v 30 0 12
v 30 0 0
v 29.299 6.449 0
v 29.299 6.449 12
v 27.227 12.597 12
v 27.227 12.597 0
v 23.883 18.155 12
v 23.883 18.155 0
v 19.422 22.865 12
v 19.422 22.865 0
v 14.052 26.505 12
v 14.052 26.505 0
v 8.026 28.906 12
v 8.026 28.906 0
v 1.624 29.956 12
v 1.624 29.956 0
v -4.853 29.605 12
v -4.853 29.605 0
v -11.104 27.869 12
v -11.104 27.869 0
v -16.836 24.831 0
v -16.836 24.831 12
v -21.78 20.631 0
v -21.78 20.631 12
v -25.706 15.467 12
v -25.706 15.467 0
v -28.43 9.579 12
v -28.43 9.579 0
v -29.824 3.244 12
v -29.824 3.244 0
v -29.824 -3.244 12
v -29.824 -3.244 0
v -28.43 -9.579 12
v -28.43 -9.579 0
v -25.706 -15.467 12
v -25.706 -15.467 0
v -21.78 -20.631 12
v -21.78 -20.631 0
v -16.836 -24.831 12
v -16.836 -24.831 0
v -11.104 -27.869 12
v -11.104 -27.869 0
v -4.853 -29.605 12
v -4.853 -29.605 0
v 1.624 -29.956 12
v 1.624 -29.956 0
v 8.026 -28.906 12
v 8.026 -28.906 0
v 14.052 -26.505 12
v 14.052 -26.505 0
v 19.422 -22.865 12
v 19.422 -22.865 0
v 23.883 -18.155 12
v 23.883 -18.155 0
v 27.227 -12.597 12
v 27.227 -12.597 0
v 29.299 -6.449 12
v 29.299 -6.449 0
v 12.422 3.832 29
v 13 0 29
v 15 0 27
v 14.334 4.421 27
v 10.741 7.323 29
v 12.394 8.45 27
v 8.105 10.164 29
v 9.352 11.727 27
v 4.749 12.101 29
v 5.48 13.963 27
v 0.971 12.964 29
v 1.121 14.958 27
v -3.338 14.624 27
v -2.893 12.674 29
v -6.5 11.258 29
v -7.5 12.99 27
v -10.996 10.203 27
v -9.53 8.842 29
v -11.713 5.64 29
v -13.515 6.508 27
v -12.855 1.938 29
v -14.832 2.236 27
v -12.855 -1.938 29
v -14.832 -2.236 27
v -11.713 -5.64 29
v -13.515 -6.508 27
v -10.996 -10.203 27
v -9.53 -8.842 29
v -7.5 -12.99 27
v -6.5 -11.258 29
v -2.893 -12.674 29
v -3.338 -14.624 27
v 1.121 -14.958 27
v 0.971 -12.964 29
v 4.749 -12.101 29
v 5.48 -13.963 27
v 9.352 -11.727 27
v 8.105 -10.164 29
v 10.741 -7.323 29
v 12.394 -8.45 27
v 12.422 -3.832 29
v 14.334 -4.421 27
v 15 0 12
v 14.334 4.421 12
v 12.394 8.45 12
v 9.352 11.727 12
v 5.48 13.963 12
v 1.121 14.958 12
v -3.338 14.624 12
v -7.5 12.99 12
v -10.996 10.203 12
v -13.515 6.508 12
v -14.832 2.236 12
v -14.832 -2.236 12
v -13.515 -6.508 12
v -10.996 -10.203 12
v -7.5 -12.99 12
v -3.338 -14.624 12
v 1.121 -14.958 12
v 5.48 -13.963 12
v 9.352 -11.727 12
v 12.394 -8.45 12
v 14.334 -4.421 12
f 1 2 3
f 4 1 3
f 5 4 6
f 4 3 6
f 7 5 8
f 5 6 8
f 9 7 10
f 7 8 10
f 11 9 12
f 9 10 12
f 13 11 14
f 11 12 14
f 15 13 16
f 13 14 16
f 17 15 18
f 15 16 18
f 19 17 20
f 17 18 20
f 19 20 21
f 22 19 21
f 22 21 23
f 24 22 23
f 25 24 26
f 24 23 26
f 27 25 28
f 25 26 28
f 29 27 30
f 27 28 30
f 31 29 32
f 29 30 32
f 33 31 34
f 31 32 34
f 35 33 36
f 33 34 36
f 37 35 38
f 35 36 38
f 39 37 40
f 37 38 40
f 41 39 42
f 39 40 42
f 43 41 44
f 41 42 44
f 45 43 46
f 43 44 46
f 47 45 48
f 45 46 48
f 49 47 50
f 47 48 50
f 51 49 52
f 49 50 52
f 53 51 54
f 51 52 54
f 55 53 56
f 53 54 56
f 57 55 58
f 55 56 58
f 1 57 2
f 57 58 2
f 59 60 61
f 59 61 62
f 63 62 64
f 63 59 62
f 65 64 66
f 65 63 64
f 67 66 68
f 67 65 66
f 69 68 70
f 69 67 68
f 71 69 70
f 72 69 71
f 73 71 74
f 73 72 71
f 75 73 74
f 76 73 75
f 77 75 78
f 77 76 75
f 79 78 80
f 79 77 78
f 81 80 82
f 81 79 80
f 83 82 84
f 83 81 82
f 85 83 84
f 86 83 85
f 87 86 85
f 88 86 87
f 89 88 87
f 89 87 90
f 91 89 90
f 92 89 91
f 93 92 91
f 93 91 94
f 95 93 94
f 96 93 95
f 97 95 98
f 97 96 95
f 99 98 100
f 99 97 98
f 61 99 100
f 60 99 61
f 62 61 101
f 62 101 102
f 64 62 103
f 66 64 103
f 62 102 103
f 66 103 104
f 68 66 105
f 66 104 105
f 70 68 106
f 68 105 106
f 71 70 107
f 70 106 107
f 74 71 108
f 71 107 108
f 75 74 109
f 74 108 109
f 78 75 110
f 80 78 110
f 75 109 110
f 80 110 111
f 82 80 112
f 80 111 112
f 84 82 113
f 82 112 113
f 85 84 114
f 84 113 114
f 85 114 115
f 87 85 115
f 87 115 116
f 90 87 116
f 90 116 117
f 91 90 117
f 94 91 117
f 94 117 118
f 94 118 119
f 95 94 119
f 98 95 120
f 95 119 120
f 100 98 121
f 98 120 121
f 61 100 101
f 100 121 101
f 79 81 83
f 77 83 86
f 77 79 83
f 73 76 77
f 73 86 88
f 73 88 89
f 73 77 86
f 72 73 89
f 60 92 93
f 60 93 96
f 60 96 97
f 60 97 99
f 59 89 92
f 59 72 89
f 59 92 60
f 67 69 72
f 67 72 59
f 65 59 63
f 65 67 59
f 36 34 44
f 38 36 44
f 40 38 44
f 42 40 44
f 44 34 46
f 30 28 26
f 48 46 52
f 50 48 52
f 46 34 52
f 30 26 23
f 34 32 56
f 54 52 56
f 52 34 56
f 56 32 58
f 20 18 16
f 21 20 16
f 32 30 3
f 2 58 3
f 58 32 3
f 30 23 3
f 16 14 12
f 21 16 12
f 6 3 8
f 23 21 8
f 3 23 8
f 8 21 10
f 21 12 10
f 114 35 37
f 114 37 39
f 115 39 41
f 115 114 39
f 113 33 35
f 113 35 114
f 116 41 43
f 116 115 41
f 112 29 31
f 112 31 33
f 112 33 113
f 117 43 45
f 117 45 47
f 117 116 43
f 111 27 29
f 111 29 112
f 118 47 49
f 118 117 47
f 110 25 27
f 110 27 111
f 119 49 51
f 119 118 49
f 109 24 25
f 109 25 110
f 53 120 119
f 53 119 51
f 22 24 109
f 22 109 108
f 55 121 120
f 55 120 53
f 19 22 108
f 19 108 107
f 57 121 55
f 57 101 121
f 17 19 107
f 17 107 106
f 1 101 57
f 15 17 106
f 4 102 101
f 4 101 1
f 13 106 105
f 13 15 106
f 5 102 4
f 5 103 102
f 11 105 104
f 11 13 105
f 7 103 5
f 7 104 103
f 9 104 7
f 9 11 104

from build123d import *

# Parameters (mm, degrees)
SKETCH1_R           = 30
BOSS_EXTRUDE3_DEPTH = 12
SKETCH3_R           = 15
BOSS_EXTRUDE4_DEPTH = 17
CHAMFER1_SIZE       = 2


with BuildPart() as part:
    # Sketch1 → Boss-Extrude3 (new body)
    with BuildSketch(Plane.XY):
        Circle(SKETCH1_R)
    extrude(amount=BOSS_EXTRUDE3_DEPTH)

    # Sketch3 → Boss-Extrude4 (add)
    with BuildSketch(Plane.XY.offset(12)):
        Circle(SKETCH3_R)
    extrude(amount=BOSS_EXTRUDE4_DEPTH)

    # Chamfer1
    chamfer1_edges = [part.edges().sort_by_distance(p)[0] for p in [
        (-15, 0, 29),
    ]]
    chamfer(chamfer1_edges, length=CHAMFER1_SIZE)


solid = part.part
